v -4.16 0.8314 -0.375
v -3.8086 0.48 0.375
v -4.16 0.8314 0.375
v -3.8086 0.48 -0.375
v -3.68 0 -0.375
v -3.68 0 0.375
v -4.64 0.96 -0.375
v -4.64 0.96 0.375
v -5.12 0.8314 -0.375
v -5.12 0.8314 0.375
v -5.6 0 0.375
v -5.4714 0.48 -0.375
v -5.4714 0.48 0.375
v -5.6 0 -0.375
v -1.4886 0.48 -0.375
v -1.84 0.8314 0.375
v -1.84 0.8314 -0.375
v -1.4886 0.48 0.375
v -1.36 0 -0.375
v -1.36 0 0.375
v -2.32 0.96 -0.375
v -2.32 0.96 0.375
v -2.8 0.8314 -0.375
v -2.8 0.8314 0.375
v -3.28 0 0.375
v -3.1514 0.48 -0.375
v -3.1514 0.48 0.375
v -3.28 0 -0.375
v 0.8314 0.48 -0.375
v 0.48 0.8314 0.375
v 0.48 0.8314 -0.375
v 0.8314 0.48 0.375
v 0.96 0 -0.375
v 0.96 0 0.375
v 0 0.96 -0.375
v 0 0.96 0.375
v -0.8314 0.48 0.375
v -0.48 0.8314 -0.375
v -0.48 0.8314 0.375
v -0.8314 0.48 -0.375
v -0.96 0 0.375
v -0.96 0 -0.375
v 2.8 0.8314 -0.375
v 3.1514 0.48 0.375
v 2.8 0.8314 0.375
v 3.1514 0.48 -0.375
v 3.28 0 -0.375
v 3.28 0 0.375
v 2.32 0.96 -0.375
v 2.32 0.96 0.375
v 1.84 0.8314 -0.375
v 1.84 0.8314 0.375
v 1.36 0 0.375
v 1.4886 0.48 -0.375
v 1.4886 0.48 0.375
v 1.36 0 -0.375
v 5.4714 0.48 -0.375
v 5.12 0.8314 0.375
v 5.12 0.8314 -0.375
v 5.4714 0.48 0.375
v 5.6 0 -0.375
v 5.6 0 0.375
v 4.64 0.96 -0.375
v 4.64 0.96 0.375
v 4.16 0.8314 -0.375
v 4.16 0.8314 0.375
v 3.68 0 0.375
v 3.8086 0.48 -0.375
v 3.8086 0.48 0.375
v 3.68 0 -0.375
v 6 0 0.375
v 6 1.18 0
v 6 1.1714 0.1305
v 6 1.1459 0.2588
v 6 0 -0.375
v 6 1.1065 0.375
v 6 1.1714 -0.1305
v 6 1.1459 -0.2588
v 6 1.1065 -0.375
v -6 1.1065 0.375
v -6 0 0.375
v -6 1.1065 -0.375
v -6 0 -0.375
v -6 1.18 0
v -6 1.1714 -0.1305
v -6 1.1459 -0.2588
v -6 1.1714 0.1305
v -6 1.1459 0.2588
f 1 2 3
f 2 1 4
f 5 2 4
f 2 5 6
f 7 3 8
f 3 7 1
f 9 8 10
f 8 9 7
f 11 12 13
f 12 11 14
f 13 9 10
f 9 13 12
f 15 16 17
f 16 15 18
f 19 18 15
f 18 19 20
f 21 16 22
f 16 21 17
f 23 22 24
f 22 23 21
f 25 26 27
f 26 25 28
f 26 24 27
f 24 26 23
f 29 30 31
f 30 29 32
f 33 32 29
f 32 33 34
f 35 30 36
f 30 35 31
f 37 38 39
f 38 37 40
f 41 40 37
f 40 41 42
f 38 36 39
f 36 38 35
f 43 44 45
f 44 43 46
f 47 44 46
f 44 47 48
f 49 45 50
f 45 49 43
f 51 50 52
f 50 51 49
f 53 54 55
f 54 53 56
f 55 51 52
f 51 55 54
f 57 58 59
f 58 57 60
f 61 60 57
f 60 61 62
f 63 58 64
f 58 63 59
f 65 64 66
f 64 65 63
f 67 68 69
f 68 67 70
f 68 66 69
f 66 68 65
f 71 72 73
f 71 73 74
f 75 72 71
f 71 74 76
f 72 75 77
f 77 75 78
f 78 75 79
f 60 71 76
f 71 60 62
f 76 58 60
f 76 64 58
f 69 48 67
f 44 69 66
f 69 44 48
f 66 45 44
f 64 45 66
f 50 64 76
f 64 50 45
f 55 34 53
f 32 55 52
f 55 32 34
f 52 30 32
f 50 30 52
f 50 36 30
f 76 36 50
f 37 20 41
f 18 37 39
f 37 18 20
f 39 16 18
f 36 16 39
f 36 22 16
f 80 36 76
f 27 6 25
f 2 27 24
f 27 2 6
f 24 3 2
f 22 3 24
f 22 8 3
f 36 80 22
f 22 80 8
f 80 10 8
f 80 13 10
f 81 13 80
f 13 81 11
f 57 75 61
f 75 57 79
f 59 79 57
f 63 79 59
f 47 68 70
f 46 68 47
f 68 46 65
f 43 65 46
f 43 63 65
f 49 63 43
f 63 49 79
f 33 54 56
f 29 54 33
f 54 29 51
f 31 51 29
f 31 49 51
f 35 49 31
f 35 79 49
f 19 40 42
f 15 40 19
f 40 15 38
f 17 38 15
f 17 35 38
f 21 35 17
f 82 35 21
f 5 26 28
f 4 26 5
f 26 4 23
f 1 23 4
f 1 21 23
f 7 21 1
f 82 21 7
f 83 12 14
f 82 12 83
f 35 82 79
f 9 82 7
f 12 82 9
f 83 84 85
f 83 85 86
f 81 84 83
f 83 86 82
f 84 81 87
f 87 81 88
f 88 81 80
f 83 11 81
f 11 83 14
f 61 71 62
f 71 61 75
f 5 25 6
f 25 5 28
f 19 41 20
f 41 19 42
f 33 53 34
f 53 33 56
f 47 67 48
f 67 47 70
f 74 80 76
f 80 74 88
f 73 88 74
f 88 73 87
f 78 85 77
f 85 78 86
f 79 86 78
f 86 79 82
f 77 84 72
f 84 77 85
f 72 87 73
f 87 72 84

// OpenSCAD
width = 12;
wall_thickness = 1.5;
rail_height = 1.2;
rail_thickness = wall_thickness / 2;
cutout_radius = rail_height * 0.8;
cutout_spacing = cutout_radius * 2 + 0.4;

intersection() {
    difference() {
        translate([-width / 2, 0, -rail_thickness / 2]) {
            cube([width, rail_height, rail_thickness], center = false);
        }
        translate([0, 0, -wall_thickness]) {
            union() {
                translate([-cutout_spacing * 2, 0, 0]) {
                    cylinder(h=wall_thickness * 2, r = cutout_radius, $fn=12);
                }
                translate([-cutout_spacing, 0, 0]) {
                    cylinder(h=wall_thickness * 2, r = cutout_radius, $fn=12);
                }
                translate([0, 0, 0]) {
                    cylinder(h=wall_thickness * 2, r = cutout_radius, $fn=12);
                }
                translate([cutout_spacing, 0, 0]) {
                    cylinder(h=wall_thickness * 2, r = cutout_radius, $fn=12);
                }
                translate([cutout_spacing * 2, 0, 0]) {
                    cylinder(h=wall_thickness * 2, r = cutout_radius, $fn=12);
                }
            }
        }
    }

    rotate([0, 90, 0]) {
        translate([0, 0.18, -width / 2]) {
            cylinder(h=width, r = 1.0, $fn=48);
        }
    }
}
